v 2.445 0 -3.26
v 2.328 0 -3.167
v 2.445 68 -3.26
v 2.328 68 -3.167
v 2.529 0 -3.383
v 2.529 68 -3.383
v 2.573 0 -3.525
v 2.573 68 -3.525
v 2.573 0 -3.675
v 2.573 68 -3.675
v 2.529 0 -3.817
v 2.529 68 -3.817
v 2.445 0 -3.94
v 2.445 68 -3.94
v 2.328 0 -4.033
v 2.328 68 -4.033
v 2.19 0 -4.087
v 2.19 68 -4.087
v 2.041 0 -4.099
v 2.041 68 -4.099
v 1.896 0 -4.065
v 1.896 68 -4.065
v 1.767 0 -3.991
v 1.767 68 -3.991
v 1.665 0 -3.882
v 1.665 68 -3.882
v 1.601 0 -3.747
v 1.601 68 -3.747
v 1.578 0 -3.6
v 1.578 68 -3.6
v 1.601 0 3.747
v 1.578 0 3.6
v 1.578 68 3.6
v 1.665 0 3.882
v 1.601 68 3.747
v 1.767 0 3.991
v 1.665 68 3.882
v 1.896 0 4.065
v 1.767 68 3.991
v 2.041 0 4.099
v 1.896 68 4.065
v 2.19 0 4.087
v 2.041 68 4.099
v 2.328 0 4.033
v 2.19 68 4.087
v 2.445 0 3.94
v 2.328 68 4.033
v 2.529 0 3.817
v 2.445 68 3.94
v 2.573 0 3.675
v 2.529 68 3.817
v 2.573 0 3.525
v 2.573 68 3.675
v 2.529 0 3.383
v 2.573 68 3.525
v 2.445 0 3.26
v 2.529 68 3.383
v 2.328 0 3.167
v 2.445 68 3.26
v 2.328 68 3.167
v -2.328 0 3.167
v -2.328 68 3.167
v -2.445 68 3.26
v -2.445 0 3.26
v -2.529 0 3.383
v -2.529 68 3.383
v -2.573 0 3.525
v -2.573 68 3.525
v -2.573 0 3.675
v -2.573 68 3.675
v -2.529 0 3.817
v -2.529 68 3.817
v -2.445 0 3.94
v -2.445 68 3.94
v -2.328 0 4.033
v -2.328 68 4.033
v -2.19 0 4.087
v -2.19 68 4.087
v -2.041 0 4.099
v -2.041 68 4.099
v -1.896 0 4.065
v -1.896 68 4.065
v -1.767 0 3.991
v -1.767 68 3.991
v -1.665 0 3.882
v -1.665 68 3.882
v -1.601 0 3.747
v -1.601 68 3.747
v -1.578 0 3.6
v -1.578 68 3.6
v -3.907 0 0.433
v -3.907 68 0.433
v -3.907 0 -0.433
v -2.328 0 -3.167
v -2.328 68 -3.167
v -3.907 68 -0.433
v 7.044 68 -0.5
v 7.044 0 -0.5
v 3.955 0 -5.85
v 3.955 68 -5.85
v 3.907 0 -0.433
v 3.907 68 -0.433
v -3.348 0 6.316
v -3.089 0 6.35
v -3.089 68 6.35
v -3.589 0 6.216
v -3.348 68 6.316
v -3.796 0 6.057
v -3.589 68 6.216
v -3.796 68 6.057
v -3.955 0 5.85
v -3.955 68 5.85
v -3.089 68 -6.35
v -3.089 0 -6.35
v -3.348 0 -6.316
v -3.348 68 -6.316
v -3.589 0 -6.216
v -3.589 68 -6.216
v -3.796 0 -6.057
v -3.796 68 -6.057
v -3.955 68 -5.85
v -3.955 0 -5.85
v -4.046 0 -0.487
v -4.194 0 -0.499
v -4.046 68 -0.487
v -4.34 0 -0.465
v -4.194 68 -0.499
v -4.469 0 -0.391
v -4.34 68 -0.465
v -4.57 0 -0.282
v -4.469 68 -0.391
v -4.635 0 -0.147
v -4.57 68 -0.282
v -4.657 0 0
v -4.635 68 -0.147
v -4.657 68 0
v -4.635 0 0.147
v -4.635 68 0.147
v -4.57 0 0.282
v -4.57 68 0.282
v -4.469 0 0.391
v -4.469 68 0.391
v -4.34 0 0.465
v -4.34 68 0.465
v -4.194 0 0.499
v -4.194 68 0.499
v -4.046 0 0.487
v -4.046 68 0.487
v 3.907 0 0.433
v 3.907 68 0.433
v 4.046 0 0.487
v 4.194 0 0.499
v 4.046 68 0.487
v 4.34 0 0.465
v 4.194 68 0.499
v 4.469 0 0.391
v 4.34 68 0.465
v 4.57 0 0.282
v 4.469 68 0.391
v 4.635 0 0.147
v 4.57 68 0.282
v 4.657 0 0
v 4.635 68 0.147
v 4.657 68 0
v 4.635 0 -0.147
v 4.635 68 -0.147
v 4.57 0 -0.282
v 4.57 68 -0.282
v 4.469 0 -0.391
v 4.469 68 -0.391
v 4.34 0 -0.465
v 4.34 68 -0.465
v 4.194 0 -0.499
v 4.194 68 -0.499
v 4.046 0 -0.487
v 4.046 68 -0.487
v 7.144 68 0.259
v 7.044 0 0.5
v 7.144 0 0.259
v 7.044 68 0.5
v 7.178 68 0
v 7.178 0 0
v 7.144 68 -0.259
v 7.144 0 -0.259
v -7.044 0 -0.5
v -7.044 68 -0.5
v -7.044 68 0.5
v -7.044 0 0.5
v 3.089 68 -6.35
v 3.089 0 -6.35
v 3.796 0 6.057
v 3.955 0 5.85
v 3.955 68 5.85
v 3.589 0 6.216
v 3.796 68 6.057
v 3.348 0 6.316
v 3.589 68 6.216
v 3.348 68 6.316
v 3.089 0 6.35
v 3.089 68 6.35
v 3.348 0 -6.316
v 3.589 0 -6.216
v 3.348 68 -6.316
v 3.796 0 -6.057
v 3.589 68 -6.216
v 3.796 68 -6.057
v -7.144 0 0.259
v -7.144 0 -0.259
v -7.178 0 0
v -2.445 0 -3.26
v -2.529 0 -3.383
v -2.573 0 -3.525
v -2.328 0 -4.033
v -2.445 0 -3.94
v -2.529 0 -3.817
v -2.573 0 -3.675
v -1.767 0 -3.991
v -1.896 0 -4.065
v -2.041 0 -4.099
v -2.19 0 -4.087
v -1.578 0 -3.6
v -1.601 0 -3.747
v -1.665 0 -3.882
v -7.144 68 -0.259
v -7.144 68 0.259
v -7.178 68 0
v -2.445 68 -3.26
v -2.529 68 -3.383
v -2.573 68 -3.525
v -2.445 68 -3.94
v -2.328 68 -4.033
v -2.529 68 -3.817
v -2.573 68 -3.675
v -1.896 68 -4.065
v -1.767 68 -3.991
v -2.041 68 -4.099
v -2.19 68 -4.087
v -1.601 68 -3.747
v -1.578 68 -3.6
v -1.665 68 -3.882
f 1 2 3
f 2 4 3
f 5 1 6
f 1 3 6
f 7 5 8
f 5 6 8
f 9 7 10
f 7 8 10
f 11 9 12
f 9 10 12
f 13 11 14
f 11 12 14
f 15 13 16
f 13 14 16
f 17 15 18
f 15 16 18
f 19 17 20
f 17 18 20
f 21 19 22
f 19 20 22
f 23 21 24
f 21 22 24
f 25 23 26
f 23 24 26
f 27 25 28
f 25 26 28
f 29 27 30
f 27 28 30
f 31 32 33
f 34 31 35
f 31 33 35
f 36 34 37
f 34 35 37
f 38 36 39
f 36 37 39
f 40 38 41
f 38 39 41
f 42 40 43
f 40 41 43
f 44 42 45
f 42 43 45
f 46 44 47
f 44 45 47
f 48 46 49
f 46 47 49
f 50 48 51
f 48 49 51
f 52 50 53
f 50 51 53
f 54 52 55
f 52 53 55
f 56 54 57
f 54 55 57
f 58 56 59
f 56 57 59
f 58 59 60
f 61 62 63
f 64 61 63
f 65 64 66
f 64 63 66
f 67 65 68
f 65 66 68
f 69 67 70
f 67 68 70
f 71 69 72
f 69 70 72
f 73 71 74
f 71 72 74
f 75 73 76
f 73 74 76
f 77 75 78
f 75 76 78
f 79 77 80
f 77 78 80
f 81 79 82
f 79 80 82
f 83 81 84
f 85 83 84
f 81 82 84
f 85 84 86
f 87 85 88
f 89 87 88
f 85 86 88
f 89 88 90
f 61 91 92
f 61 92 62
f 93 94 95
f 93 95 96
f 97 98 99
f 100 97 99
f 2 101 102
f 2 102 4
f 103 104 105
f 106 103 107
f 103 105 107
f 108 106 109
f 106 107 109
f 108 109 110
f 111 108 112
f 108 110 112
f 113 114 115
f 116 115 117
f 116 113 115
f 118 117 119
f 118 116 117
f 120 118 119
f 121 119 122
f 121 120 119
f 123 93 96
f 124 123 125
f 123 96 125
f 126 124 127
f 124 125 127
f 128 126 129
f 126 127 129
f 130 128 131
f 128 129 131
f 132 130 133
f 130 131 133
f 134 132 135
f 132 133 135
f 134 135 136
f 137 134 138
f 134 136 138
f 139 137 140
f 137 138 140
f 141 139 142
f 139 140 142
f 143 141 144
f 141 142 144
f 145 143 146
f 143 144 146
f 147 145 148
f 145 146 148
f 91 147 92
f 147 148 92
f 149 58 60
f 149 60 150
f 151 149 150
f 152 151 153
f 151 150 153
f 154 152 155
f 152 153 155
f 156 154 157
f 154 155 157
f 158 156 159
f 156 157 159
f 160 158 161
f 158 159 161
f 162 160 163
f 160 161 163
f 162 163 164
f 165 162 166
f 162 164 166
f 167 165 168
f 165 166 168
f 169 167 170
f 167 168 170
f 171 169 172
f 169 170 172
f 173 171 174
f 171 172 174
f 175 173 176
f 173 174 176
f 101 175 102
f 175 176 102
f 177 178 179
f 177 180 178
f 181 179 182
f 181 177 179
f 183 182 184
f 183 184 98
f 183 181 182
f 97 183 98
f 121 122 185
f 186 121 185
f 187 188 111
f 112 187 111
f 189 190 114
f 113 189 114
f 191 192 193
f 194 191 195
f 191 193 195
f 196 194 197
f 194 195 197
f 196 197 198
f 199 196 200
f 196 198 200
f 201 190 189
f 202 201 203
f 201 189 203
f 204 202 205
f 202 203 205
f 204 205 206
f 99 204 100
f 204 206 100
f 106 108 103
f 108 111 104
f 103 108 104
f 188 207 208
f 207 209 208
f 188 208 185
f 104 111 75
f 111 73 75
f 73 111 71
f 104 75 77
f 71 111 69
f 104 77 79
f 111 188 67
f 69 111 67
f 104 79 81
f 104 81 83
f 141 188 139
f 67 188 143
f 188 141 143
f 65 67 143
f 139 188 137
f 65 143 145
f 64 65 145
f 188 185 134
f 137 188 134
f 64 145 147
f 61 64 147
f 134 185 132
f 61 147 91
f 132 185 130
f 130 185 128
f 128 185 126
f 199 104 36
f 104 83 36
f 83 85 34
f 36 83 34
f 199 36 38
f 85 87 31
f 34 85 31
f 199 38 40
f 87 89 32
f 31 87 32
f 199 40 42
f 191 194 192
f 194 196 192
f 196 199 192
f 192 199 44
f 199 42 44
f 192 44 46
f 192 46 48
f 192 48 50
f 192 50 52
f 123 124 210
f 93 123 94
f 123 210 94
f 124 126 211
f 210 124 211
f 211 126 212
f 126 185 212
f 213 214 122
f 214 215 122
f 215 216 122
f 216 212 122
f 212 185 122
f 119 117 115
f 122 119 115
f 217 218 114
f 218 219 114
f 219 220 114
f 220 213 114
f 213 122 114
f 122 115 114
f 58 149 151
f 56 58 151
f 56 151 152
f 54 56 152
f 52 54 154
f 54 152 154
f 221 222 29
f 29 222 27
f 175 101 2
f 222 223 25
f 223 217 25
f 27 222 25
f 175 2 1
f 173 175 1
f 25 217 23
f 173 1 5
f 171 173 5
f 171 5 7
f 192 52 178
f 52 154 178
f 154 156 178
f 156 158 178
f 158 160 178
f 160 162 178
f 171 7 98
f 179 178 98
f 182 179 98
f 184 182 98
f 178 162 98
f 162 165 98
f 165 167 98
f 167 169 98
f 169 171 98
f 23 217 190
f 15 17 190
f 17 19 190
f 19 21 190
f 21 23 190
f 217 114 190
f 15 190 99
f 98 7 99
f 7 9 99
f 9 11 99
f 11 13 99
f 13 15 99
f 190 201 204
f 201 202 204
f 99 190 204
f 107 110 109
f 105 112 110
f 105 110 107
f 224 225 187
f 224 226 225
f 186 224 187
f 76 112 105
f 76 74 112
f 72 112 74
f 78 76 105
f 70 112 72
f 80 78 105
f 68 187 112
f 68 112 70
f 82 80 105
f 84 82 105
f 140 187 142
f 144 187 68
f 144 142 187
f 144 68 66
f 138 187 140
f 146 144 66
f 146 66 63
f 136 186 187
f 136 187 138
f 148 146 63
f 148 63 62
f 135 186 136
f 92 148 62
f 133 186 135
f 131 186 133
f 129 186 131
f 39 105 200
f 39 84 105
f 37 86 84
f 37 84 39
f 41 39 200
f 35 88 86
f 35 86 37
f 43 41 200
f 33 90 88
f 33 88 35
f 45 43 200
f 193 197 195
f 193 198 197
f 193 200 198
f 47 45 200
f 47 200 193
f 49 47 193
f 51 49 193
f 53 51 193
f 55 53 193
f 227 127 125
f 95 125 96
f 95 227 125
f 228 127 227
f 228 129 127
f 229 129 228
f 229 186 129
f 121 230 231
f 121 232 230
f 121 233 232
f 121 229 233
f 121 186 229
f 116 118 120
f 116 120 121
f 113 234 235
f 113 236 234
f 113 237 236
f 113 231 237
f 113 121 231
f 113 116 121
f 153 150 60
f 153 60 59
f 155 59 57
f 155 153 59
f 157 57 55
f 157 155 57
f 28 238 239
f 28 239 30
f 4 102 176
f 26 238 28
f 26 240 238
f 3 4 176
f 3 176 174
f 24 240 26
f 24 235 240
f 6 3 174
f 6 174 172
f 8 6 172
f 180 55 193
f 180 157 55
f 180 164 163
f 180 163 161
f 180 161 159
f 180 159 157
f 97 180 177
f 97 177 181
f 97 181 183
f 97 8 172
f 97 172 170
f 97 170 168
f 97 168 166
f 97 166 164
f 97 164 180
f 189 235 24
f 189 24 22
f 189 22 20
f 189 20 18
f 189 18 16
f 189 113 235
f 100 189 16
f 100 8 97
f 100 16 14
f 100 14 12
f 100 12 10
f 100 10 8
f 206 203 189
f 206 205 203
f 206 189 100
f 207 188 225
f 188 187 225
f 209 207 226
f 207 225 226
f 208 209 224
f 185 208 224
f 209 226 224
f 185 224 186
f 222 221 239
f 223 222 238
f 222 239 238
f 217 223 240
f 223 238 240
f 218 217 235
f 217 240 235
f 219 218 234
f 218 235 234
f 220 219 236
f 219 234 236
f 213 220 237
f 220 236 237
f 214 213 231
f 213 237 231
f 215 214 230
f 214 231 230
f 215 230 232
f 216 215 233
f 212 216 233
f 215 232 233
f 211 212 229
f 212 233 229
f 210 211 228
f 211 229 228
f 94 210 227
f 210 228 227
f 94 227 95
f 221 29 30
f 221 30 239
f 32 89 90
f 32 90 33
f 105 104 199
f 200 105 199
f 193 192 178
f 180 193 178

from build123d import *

# Parameters (mm, degrees)
BOSS_EXTRUDE1_DEPTH = 68
SKETCH2_R           = 0.5
CUT_EXTRUDE1_DEPTH  = 69.68832385
FILLET1_R           = 1


with BuildPart() as part:
    # Sketch1 → Boss-Extrude1 (new body)
    with BuildSketch(Plane(origin=(0, 0, 0), x_dir=(1, 0, 0), z_dir=(0, 1, 0))):
        Polygon((3.666174209, 6.35), (-3.666174209, 6.35), (-7.332348419, 0), (-3.666174209, -6.35), (3.666174209, -6.35), (7.332348419, 0), align=None)
        Polygon((2.078460969, 3.6), (-2.078460969, 3.6), (-4.156921938, 0), (-2.078460969, -3.6), (2.078460969, -3.6), (4.156921938, 0), align=None, mode=Mode.SUBTRACT)
    extrude(amount=BOSS_EXTRUDE1_DEPTH)

    # Sketch2 → Cut-Extrude1 (cut, through all)
    with BuildSketch(Plane(origin=(0, 68, 0), x_dir=(1, 0, 0), z_dir=(0, 1, 0))):
        with Locations((-2.078460969, 3.6)):
            Circle(SKETCH2_R)
        with Locations((2.078460969, 3.6)):
            Circle(SKETCH2_R)
        with Locations((4.156921938, 0)):
            Circle(SKETCH2_R)
        with Locations((2.078460969, -3.6)):
            Circle(SKETCH2_R)
        with Locations((-2.078460969, -3.6)):
            Circle(SKETCH2_R)
        with Locations((-4.156921938, 0)):
            Circle(SKETCH2_R)
    extrude(amount=-CUT_EXTRUDE1_DEPTH, mode=Mode.SUBTRACT)

    # Fillet1
    fillet1_edges = [part.edges().sort_by_distance(p)[0] for p in [
        (7.332348419, 34, 0),
        (3.666174209, 34, 6.35),
        (-3.666174209, 34, 6.35),
        (-7.332348419, 34, 0),
        (-3.666174209, 34, -6.35),
        (3.666174209, 34, -6.35),
    ]]
    fillet(fillet1_edges, radius=FILLET1_R)


solid = part.part
